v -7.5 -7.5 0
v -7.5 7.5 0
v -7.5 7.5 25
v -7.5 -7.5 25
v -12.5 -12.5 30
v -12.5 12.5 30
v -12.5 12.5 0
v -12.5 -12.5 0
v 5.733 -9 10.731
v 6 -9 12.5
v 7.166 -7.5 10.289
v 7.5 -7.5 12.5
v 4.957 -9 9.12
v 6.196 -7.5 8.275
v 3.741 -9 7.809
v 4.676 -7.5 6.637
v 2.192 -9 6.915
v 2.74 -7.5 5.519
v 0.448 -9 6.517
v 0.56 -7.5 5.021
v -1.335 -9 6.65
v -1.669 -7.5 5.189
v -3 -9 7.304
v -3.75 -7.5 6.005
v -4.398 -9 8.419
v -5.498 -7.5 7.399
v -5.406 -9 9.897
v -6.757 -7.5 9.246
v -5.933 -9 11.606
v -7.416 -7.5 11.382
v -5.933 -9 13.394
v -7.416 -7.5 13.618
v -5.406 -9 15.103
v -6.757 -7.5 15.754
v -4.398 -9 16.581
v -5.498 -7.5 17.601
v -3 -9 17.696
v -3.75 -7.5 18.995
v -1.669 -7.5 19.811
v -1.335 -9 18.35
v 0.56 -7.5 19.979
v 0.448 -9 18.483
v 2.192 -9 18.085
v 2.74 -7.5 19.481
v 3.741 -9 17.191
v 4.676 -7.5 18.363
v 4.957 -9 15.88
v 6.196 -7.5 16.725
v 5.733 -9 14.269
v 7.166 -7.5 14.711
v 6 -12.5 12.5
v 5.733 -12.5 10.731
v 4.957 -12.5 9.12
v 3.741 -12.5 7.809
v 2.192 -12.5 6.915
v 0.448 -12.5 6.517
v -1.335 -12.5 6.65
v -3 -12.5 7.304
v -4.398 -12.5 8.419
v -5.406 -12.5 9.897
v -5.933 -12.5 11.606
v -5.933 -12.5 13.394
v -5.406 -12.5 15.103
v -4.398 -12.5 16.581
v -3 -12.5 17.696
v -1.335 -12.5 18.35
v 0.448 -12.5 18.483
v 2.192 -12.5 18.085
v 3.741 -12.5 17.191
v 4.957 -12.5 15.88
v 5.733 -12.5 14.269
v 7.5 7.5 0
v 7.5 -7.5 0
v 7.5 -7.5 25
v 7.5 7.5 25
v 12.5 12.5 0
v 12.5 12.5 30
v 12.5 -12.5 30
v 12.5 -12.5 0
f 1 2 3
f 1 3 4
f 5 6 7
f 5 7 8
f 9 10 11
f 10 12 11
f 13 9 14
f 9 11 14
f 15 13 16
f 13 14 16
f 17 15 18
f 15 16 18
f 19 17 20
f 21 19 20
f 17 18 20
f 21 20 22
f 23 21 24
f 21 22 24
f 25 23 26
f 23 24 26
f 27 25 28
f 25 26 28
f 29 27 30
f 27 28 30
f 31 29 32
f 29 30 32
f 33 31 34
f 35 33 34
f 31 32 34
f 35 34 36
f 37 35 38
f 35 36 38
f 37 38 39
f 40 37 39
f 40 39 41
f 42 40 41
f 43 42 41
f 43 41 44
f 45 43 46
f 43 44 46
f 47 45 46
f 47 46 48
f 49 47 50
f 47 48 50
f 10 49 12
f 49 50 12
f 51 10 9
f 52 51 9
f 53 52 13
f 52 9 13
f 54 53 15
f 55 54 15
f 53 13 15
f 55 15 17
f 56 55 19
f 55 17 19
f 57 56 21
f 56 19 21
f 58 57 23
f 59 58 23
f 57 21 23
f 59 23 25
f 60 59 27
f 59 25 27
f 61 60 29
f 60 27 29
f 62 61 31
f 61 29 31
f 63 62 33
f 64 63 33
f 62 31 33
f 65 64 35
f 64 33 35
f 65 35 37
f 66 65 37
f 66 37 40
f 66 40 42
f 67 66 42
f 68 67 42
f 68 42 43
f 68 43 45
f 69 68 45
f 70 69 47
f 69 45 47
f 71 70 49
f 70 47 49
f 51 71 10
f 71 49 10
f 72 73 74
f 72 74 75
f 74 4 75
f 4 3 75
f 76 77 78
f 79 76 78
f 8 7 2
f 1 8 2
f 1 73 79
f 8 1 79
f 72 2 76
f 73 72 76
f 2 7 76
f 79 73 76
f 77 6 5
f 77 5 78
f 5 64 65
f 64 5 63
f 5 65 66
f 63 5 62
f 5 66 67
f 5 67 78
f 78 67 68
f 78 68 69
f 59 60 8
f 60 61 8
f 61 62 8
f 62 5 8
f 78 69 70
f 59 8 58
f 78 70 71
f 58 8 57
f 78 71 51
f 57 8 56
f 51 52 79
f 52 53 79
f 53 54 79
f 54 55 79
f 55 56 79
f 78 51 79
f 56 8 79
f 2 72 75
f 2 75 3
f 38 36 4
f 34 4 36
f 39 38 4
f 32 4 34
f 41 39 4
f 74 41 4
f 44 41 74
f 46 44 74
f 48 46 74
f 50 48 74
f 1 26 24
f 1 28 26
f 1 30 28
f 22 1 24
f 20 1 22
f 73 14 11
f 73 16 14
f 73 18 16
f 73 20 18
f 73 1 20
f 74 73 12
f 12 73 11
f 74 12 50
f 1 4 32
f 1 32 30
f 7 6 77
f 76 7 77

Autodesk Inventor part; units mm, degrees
ref_plane "YZ Plane" through (0, 0, 0) normal (1, 0, 0) x (0, 1, 0)
ref_plane "XZ Plane" through (0, 0, 0) normal (0, 1, 0) x (-1, 0, 0)
ref_plane "XY Plane" through (0, 0, 0) normal (0, 0, 1) x (1, 0, 0)
sketch "Sketch2" plane through (0, 0, 0) normal (0, 0, 1) x (1, 0, 0)
  circle A0 centre (0, 0) radius 7.5
  line L0 (12.5, 12.5) -> (-12.5, 12.5)
  line L1 (-12.5, 12.5) -> (-12.5, -12.5)
  line L2 (-12.5, -12.5) -> (12.5, -12.5)
  line L3 (12.5, -12.5) -> (12.5, 12.5)
  line L4 (7.5, 7.5) -> (-7.5, 7.5)
  line L5 (-7.5, 7.5) -> (-7.5, -7.5)
  line L6 (-7.5, -7.5) -> (7.5, -7.5)
  line L7 (7.5, -7.5) -> (7.5, 7.5)
  dimension "d0" = 15
  dimension "d1" = 25
  dimension "d2" = 25
  dimension "d3" = 12.5
  dimension "d4" = 12.5
  dimension "d5" = 15
  dimension "d6" = 15
extrude "Extrusion1" add sketch "Sketch2" along normal blind 25
sketch "Sketch3" plane through (-7.5, -7.5, 0) normal (0, 1, 0) x (1, 0, 0)
  line L0 (15, 0) -> (15, -25) projected
  line L1 (0, 0) -> (0, -25) projected
  line L2 (15, -20) -> (0, -20)
  line L3 (0, -20) -> (0, -5)
  line L4 (0, -5) -> (15, -5)
  line L5 (15, -5) -> (15, -20)
  circle A0 centre (7.5, -12.5) radius 6
  point P0 (7.5, 0)
  dimension "d9" = 15
  dimension "d10" = 12
extrude "Extrusion2" cut sketch "Sketch3" against normal blind 5 contours A0
chamfer "Chamfer1" distance 1.5 angle 45 1 edges at (-6, -7.5, 12.5)
sketch "Sketch4" plane through (0, 0, 25) normal (0, 0, 1) x (1, 0, 0)
  line L0 (-12.5, 12.5) -> (-12.5, -12.5) projected
  line L1 (-12.5, -12.5) -> (12.5, -12.5) projected
  line L2 (-12.5, 12.5) -> (12.5, 12.5)
  line L3 (12.5, 12.5) -> (12.5, -12.5)
  line L4 (12.5, -12.5) -> (-12.5, -12.5)
  line L5 (-12.5, -12.5) -> (-12.5, 12.5)
  point P0 (0, 0)
extrude "Extrusion3" add sketch "Sketch4" along normal blind 5
equation "\"d3\" = 0.5 * d2"
equation "\"d4\" = 0.5 * d2"
properties part number "Example Slider"
